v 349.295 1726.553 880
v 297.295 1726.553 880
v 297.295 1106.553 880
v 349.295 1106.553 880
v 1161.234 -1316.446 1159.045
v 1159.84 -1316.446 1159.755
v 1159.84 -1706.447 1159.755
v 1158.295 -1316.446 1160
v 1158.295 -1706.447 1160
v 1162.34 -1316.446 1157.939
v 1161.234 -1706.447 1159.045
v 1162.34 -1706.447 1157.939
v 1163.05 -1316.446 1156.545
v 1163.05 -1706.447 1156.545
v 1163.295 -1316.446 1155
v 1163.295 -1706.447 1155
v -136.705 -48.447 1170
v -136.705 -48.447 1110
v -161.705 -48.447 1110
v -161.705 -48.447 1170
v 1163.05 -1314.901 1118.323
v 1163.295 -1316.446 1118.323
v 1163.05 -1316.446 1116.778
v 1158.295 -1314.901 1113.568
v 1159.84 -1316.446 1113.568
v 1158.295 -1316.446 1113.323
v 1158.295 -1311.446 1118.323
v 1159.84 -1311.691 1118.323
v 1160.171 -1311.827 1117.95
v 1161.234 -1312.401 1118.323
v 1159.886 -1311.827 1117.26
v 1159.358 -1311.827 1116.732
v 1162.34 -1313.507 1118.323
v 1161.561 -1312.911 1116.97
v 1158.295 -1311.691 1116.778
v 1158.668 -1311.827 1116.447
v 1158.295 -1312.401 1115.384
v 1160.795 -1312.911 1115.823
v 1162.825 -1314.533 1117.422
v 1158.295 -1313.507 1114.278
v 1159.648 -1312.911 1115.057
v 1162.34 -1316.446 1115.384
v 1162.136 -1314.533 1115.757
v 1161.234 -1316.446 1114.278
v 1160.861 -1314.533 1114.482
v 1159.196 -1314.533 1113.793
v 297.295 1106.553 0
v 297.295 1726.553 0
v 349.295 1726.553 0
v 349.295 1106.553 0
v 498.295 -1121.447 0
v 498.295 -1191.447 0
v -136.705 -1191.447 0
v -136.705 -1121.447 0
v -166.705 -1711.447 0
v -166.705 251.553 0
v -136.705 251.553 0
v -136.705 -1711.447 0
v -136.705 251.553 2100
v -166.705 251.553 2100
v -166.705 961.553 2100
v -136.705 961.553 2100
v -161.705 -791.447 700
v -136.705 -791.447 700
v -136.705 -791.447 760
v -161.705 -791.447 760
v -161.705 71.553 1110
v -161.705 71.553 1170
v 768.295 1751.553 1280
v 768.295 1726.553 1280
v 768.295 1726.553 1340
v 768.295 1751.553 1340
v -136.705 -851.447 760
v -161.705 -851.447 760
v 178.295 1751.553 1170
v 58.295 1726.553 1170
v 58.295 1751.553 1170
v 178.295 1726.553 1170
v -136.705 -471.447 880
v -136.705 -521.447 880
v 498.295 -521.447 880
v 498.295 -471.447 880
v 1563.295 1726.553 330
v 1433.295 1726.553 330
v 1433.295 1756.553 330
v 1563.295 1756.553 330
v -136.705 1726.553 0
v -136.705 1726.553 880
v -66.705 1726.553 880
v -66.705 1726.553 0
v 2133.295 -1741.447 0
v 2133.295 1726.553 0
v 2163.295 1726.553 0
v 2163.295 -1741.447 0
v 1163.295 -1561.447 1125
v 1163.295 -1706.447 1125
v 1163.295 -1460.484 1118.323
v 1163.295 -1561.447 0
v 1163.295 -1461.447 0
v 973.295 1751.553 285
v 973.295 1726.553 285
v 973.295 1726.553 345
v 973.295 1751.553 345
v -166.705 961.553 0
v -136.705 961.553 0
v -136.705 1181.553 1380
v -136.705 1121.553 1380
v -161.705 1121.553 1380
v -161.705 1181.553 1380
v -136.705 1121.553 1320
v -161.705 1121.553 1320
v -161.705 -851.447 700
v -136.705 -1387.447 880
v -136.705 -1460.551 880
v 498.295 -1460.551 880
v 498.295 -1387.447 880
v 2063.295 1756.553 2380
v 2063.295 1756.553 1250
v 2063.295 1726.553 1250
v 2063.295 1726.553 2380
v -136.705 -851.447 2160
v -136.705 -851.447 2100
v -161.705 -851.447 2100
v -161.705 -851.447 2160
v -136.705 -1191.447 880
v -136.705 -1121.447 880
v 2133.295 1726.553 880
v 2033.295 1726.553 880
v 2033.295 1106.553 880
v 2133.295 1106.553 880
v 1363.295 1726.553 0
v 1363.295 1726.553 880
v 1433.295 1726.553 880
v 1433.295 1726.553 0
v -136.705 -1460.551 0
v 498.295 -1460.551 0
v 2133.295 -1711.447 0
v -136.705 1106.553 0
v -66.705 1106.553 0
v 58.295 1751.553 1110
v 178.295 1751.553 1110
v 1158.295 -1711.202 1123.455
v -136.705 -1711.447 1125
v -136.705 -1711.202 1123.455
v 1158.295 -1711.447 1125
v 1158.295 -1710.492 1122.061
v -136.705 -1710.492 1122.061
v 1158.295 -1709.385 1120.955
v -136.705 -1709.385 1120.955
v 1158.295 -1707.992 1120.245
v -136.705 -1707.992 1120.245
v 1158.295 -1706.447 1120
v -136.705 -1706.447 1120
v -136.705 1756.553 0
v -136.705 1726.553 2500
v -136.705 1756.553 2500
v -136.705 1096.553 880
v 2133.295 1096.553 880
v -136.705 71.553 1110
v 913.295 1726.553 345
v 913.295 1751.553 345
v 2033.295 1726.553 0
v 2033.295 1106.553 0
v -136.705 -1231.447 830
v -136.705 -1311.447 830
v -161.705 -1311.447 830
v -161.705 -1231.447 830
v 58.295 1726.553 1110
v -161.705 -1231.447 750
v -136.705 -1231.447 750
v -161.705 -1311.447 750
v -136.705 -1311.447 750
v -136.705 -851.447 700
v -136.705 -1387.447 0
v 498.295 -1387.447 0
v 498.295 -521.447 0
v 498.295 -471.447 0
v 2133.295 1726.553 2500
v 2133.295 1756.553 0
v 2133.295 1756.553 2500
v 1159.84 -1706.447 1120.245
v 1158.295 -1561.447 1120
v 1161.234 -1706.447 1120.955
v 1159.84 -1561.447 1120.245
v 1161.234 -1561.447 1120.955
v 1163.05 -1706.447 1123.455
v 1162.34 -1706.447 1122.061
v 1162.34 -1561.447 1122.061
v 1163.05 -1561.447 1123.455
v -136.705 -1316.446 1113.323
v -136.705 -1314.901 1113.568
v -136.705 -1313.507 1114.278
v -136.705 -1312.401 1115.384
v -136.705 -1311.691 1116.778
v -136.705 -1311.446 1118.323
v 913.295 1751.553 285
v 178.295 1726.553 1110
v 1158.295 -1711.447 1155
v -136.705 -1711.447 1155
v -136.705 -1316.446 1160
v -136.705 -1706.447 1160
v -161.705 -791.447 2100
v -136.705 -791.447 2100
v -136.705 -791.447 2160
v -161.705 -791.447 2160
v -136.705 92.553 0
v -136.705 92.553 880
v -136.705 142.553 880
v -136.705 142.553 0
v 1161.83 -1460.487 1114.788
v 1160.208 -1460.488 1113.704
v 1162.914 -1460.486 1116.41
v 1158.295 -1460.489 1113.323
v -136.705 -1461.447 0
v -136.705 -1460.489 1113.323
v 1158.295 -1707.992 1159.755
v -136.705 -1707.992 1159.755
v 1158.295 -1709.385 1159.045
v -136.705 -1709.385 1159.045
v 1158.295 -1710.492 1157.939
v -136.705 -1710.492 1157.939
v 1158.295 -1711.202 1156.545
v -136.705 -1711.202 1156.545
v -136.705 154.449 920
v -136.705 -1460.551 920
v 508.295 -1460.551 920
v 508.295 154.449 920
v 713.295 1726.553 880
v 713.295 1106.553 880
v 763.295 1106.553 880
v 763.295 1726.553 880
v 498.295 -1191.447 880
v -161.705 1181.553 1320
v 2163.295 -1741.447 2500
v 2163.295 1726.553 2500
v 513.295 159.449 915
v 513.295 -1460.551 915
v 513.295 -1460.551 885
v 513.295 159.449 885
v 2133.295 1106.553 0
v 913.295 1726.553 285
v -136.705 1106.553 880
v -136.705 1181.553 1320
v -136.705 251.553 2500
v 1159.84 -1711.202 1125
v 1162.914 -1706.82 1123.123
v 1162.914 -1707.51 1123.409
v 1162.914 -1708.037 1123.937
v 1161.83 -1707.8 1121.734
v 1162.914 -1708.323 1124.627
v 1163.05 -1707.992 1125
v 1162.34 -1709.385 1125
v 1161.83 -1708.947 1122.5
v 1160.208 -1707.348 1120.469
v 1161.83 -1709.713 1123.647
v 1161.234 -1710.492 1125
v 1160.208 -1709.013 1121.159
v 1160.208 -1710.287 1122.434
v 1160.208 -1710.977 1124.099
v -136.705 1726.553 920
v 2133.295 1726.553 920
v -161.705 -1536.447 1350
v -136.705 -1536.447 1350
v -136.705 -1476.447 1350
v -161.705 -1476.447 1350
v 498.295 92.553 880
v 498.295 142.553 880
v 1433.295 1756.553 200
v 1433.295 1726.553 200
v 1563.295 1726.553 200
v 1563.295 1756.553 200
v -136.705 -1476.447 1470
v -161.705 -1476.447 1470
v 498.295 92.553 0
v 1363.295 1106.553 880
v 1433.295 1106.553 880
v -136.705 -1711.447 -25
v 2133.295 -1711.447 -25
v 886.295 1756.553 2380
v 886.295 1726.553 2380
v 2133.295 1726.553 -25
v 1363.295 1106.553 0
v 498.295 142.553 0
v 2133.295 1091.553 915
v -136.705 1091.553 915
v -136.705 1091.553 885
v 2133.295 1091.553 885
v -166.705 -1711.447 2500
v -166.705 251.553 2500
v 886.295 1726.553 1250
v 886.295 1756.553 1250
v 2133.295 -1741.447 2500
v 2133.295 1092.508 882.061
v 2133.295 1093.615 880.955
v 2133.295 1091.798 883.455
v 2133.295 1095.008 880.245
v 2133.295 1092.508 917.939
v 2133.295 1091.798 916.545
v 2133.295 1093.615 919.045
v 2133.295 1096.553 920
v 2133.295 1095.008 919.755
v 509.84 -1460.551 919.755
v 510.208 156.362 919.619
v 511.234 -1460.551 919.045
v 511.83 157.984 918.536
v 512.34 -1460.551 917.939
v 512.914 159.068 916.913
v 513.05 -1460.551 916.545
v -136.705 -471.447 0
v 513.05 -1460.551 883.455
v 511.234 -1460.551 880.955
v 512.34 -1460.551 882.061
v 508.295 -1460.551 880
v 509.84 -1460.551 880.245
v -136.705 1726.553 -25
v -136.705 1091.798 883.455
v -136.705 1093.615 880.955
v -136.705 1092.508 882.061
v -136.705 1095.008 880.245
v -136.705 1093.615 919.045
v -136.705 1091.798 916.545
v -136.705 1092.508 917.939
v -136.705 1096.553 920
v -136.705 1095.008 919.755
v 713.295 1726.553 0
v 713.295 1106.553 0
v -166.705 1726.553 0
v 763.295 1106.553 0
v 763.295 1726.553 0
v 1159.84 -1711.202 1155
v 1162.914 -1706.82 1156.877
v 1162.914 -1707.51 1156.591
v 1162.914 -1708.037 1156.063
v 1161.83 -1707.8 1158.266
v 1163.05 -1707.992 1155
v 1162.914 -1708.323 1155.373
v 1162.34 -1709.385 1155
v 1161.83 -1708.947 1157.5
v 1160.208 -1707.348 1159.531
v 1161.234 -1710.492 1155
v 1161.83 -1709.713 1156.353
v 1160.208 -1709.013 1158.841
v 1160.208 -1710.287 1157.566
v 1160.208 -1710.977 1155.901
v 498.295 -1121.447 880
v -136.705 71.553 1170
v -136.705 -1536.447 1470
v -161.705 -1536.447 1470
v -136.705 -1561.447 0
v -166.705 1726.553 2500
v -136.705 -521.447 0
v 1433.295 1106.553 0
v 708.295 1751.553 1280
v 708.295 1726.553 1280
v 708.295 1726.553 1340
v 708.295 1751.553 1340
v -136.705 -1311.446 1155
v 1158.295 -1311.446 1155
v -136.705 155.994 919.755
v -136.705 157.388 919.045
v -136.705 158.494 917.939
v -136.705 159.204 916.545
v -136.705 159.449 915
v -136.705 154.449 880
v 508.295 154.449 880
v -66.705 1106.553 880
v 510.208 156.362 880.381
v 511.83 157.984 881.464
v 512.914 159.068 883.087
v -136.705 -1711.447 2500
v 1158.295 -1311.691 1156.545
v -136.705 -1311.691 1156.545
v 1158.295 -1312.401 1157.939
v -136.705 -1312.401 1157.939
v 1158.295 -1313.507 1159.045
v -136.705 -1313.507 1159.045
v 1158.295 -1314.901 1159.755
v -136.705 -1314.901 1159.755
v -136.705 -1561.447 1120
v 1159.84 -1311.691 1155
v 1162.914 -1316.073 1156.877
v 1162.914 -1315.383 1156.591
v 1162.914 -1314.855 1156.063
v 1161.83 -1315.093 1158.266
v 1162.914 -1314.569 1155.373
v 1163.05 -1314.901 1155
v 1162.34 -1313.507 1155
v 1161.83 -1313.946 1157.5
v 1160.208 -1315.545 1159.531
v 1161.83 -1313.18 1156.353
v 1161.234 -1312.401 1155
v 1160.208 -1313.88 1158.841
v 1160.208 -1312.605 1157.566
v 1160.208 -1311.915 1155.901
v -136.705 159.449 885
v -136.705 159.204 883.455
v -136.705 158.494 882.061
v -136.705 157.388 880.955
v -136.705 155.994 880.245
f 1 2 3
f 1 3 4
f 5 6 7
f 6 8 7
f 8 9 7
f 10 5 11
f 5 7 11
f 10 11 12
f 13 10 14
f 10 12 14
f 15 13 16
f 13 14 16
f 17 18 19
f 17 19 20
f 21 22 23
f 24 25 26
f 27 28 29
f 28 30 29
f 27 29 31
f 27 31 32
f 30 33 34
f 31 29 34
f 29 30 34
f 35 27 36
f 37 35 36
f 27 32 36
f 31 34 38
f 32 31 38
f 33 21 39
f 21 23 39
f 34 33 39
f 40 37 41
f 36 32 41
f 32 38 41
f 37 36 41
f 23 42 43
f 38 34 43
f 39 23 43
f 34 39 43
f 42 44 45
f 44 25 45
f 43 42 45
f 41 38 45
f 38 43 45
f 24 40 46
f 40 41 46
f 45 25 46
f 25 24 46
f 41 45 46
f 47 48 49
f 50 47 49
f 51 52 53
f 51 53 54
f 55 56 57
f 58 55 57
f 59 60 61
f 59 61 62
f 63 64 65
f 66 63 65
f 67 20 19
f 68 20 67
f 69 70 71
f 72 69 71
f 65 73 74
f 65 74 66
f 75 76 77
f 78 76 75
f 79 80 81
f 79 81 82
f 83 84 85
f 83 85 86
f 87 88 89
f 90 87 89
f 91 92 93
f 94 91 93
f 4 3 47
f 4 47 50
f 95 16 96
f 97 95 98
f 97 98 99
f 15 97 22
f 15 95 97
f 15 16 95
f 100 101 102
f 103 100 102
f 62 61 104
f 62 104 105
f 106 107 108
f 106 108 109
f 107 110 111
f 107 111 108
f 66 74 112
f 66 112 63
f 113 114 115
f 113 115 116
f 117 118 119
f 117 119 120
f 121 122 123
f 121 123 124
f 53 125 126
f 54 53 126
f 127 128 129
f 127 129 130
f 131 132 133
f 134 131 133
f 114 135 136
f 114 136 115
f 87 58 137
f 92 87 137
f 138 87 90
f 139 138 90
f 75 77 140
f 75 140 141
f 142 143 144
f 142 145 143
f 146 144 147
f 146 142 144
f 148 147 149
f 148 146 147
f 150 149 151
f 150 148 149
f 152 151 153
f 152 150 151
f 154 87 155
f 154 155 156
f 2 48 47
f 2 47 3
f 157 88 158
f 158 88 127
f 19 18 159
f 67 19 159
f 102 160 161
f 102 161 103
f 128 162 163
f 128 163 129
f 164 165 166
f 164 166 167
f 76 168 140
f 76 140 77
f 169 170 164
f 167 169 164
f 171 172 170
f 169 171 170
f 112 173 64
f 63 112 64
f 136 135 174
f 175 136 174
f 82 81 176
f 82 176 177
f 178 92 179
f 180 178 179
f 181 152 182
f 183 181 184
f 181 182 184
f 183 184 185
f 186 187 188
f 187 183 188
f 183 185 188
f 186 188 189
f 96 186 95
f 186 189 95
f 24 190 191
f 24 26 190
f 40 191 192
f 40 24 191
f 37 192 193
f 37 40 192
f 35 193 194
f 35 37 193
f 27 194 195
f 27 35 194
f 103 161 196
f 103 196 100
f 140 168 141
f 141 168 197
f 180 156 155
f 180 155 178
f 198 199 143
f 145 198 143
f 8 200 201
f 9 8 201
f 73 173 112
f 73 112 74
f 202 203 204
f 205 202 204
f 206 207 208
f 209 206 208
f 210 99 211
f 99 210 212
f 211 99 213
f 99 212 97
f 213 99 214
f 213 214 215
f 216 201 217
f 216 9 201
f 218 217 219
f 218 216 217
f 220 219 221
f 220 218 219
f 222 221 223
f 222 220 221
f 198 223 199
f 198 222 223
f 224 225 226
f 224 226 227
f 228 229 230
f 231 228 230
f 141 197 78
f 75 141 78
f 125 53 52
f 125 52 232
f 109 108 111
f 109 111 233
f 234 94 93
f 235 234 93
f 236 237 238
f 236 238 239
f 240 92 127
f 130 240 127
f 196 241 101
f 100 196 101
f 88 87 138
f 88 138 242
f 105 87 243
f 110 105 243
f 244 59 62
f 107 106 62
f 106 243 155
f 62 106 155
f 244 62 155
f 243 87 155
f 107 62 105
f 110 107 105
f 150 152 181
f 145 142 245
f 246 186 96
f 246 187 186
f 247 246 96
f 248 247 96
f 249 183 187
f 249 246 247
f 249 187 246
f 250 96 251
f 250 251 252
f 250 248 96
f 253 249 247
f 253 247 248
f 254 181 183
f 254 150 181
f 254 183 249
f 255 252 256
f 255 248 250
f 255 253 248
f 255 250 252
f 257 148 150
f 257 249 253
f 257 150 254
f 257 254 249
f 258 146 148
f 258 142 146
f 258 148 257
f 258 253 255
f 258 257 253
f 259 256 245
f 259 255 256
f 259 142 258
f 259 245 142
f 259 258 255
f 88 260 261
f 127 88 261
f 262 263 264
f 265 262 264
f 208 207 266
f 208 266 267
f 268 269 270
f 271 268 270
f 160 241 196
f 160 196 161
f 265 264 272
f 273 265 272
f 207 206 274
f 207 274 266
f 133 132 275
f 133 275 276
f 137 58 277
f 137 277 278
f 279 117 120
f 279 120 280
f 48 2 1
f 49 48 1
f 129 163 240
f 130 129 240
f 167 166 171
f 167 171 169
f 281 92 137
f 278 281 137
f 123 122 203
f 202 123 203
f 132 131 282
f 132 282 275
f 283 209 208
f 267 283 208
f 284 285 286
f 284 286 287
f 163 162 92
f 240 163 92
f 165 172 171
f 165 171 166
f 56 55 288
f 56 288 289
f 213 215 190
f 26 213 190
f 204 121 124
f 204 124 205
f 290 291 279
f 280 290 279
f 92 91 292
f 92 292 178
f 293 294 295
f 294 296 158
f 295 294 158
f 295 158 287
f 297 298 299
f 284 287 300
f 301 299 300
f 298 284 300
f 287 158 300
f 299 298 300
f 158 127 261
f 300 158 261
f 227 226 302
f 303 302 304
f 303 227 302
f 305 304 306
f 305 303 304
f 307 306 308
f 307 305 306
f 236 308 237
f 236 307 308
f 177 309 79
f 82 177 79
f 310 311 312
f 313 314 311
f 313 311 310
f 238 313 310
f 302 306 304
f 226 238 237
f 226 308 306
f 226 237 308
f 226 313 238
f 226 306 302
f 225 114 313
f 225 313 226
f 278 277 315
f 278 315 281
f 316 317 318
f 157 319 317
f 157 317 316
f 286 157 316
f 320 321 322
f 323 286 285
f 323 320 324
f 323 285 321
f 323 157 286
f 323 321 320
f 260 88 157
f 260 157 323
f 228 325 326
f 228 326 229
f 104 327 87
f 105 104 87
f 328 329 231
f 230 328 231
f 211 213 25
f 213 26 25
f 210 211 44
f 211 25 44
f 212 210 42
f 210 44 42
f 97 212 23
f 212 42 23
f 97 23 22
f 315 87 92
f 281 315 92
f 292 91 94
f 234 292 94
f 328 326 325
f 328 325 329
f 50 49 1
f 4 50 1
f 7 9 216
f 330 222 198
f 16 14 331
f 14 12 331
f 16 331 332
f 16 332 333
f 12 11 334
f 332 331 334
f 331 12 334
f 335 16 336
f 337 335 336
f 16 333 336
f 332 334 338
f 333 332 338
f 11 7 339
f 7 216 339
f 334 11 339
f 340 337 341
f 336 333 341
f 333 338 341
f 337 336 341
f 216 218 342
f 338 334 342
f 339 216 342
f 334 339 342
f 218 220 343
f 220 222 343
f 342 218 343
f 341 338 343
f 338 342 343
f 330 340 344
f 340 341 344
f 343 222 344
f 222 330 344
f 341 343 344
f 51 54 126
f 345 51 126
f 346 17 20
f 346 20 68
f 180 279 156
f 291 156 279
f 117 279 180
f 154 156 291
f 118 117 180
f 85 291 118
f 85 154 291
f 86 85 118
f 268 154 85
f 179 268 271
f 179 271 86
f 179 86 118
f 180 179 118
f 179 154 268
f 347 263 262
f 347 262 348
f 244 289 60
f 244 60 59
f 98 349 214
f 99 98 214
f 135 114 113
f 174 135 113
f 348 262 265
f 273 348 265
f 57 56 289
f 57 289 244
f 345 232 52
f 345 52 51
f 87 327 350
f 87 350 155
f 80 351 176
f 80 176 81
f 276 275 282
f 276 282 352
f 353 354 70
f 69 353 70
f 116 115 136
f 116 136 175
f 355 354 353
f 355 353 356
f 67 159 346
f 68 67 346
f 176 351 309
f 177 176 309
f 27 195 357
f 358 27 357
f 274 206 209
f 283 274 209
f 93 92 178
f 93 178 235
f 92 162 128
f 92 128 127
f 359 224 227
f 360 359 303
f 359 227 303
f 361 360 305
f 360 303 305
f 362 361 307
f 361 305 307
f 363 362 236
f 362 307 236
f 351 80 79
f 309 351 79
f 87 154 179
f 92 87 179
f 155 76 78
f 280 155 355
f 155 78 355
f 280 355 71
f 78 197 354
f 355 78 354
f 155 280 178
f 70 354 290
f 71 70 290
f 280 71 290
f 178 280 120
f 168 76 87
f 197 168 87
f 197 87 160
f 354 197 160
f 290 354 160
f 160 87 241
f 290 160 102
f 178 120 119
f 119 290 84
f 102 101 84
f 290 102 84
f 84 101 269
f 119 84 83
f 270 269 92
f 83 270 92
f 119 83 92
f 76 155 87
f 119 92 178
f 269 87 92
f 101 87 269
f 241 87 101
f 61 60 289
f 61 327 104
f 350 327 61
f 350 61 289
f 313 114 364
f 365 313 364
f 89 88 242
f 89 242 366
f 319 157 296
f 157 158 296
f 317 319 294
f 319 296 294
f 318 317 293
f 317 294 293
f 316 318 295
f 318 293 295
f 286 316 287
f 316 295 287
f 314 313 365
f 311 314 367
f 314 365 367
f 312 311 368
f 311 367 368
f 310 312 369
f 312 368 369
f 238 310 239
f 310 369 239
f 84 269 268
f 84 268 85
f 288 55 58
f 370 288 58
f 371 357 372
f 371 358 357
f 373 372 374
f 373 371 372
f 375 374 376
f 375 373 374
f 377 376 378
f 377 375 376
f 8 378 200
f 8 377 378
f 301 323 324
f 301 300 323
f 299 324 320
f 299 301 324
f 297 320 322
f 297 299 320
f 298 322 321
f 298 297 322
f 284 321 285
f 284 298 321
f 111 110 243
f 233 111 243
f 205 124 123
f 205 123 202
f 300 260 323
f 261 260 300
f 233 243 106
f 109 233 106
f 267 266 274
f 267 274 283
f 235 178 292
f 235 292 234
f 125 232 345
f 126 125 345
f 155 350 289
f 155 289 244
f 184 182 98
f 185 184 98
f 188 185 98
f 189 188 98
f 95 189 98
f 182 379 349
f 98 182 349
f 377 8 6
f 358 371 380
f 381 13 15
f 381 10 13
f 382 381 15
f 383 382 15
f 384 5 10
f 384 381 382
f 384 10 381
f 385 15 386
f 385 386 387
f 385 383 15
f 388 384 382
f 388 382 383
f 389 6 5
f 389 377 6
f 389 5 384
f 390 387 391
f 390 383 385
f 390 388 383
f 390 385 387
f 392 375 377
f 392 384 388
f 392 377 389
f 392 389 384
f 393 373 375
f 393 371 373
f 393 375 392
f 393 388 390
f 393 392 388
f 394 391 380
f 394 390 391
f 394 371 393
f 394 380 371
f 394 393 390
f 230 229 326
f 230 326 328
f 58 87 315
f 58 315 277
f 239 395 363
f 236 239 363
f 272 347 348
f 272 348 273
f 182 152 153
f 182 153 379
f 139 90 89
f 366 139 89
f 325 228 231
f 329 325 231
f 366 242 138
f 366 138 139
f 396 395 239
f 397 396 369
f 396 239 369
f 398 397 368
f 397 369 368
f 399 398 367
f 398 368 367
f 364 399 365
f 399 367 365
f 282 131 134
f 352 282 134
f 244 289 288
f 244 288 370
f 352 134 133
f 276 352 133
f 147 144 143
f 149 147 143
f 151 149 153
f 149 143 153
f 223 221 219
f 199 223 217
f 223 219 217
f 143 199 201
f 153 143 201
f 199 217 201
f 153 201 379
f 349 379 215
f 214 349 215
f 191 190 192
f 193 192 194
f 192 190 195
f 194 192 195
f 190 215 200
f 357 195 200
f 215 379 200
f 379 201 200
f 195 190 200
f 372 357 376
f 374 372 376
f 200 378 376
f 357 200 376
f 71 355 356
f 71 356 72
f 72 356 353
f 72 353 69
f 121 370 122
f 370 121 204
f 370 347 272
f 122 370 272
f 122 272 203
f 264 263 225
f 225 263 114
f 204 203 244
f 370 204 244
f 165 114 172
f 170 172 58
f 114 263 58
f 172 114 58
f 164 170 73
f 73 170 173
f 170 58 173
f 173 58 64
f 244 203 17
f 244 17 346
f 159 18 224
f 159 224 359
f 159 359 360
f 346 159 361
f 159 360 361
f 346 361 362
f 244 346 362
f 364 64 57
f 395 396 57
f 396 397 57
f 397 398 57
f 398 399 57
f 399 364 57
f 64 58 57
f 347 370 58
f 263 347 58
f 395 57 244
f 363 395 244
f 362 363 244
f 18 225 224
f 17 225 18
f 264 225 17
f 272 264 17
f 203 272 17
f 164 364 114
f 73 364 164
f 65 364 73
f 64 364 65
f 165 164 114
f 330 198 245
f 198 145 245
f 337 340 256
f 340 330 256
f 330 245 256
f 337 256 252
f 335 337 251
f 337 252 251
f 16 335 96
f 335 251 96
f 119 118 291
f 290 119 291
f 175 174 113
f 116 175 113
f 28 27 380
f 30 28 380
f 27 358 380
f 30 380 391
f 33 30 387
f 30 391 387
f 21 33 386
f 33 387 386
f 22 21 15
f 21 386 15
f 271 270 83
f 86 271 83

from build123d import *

# Parameters (mm, degrees)
F0_W      = 2270
F0_H      = 30
F1_DEPTH  = 2500
F0_W_2    = 30
F0_H_2    = 3468
F0_H_3    = 765
F0_H_4    = 1963
F2_W      = 2270
F2_H      = 3438
F3_DEPTH  = 25
F4_W      = 2270
F4_H      = 40
F5_DEPTH  = 635
F7_DEPTH  = 1300
F6_W      = 1620
F6_H      = 40
F8_DEPTH  = 650
F9_W      = 1177
F9_H      = 1130
F10_DEPTH = 3498.001
F11_W     = 30
F11_H     = 400
F12_DEPTH = 710
F13_W     = 70
F13_H     = 880
F14_DEPTH = 635
F13_W_2   = 73.1048560888
F13_W_3   = 50
F15_R     = 5
F16_R     = 5
F17_R     = 5
F18_W     = 100
F18_H     = 880
F19_DEPTH = 620
F18_W_2   = 70
F18_W_3   = 50
F18_W_4   = 52
F20_W     = 60
F20_H     = 120
F20_H_2   = 60
F20_W_2   = 80
F20_H_3   = 80
F20_W_3   = 120
F21_DEPTH = 25
F22_W     = 60
F22_H     = 60
F22_W_2   = 120
F22_W_3   = 130
F22_H_2   = 130
F23_DEPTH = 25
F24_DEPTH = 100


with BuildPart() as f1:
    # F0 (on Top) → F1 (new body)
    with BuildSketch(Plane.XY):
        with Locations((998.2948233199, 1741.5534749776)):
            Rectangle(F0_W, F0_H)
    extrude(amount=F1_DEPTH)

    # F9 (on face) → F10 (cut, through all)
    with BuildSketch(Plane(origin=(0, 1756.5534749776, 0), x_dir=(-1, 0, 0), z_dir=(0, 1, 0))):
        with Locations((-1474.7948233199, 1815)):
            Rectangle(F9_W, F9_H)
    extrude(amount=-F10_DEPTH, mode=Mode.SUBTRACT)

    # F22 (on face) → F23 (cut)
    with BuildSketch(Plane.XZ.offset(-1726.5534749776)):
        with Locations((738.2948233199, 1310)):
            Rectangle(F22_W, F22_H)
        with Locations((118.2948233199, 1140)):
            Rectangle(F22_W_2, F22_H)
        with Locations((943.2948233199, 315)):
            Rectangle(F22_W, F22_H)
        with Locations((1498.2948233199, 265)):
            Rectangle(F22_W_3, F22_H_2)
    extrude(amount=-F23_DEPTH, mode=Mode.SUBTRACT)

    # F22 (on face) → F24 (cut)
    with BuildSketch(Plane.XZ.offset(-1726.5534749776)):
        with Locations((1498.2948233199, 265)):
            Rectangle(F22_W_3, F22_H_2)
    extrude(amount=-F24_DEPTH, mode=Mode.SUBTRACT)


with BuildPart() as f1b:
    # F0 (on Top) → F1, piece 2 (new body)
    with BuildSketch(Plane.XY):
        with Locations((2148.2948233199, -7.4465250224)):
            Rectangle(F0_W_2, F0_H_2)
    extrude(amount=F1_DEPTH)


with BuildPart() as f1c:
    # F0 (on Top) → F1, piece 3 (new body)
    with BuildSketch(Plane.XY):
        with Locations((-151.7051766801, 1344.0534749776)):
            Rectangle(F0_W_2, F0_H_3)
    extrude(amount=F1_DEPTH)

    # F11 (on face) → F12 (join)
    with BuildSketch(Plane.XZ.offset(-961.5534749776)):
        with Locations((-151.7051766801, 2300)):
            Rectangle(F11_W, F11_H)
    extrude(amount=F12_DEPTH)


with BuildPart() as f1d:
    # F0 (on Top) → F1, piece 4 (new body)
    with BuildSketch(Plane.XY):
        with Locations((-151.7051766801, -729.9465250224)):
            Rectangle(F0_W_2, F0_H_4)
    extrude(amount=F1_DEPTH)

    # F6 (on face) → F8 (join)
    with BuildSketch(Plane.YZ.offset(-136.7051766801)):
        with Locations((-650.5513811111, 900)):
            Rectangle(F6_W, F6_H)
    extrude(amount=F8_DEPTH)

    # F15
    f15_edges = [f1d.edges().sort_by_distance(p)[0] for p in [
        (188.294823, 159.448619, 920),
        (513.294823, -650.551381, 920),
        (188.294823, 159.448619, 880),
        (513.294823, -650.551381, 880),
    ]]
    fillet(f15_edges, radius=F15_R)


with BuildPart() as f3:
    # F2 (on face) → F3 (new body)
    with BuildSketch(Plane(origin=(0, 0, 0), x_dir=(1, 0, 0), z_dir=(0, 0, -1))):
        with Locations((998.2948233199, -7.5534749776)):
            Rectangle(F2_W, F2_H)
    extrude(amount=F3_DEPTH)


with BuildPart() as f5:
    # F4 (on face) → F5 (new body)
    with BuildSketch(Plane.XZ.offset(-1726.5534749776)):
        with Locations((998.2948233199, 900)):
            Rectangle(F4_W, F4_H)
    extrude(amount=F5_DEPTH)

    # F17
    f17_edges = [f5.edges().sort_by_distance(p)[0] for p in [
        (998.294823, 1091.553475, 920),
        (998.294823, 1091.553475, 880),
    ]]
    fillet(f17_edges, radius=F17_R)


with BuildPart() as f7:
    # F6 (on face) → F7 (new body)
    with BuildSketch(Plane.YZ.offset(-136.7051766801)):
        Polygon((-1461.4465250224, 0), (-1460.689416728, 880), (-1460.4886770248, 1113.3232116699), (-1311.446047813, 1113.3232116699), (-1311.446047813, 1160), (-1511.4465250224, 1160), (-1711.4465250224, 1160), (-1711.4465250224, 1120), (-1561.4465250224, 1120), (-1561.4465250224, 0), align=None)
    extrude(amount=F7_DEPTH)

    # F16
    f16_edges = [f7.edges().sort_by_distance(p)[0] for p in [
        (513.294823, -1711.446525, 1160),
        (513.294823, -1311.446048, 1160),
        (1163.294823, -1511.446286, 1160),
        (513.294823, -1711.446525, 1120),
        (1163.294823, -1636.446525, 1120),
        (1163.294823, -1385.967362, 1113.323212),
        (1163.294823, -1711.446525, 1140),
        (1163.294823, -1311.446048, 1136.661606),
        (513.294823, -1311.446048, 1113.323212),
    ]]
    fillet(f16_edges, radius=F16_R)


with BuildPart() as f14:
    # F13 (on face) → F14 (new body)
    with BuildSketch(Plane.YZ.offset(-136.7051766801)):
        with Locations((-1156.4465250224, 440)):
            Rectangle(F13_W, F13_H)
    extrude(amount=F14_DEPTH)


with BuildPart() as f14b:
    # F13 (on face) → F14, piece 2 (new body)
    with BuildSketch(Plane.YZ.offset(-136.7051766801)):
        with Locations((-1423.9989530668, 440)):
            Rectangle(F13_W_2, F13_H)
    extrude(amount=F14_DEPTH)


with BuildPart() as f14c:
    # F13 (on face) → F14, piece 3 (new body)
    with BuildSketch(Plane.YZ.offset(-136.7051766801)):
        with Locations((-496.4465250224, 440)):
            Rectangle(F13_W_3, F13_H)
    extrude(amount=F14_DEPTH)


with BuildPart() as f14d:
    # F13 (on face) → F14, piece 4 (new body)
    with BuildSketch(Plane.YZ.offset(-136.7051766801)):
        with Locations((117.5534749776, 440)):
            Rectangle(F13_W_3, F13_H)
    extrude(amount=F14_DEPTH)


with BuildPart() as f19:
    # F18 (on face) → F19 (new body)
    with BuildSketch(Plane.XZ.offset(-1726.5534749776)):
        with Locations((2083.2948233199, 440)):
            Rectangle(F18_W, F18_H)
    extrude(amount=F19_DEPTH)


with BuildPart() as f19b:
    # F18 (on face) → F19, piece 2 (new body)
    with BuildSketch(Plane.XZ.offset(-1726.5534749776)):
        with Locations((1398.2948233199, 440)):
            Rectangle(F18_W_2, F18_H)
    extrude(amount=F19_DEPTH)


with BuildPart() as f19c:
    # F18 (on face) → F19, piece 3 (new body)
    with BuildSketch(Plane.XZ.offset(-1726.5534749776)):
        with Locations((738.2948233199, 440)):
            Rectangle(F18_W_3, F18_H)
    extrude(amount=F19_DEPTH)


with BuildPart() as f19d:
    # F18 (on face) → F19, piece 4 (new body)
    with BuildSketch(Plane.XZ.offset(-1726.5534749776)):
        with Locations((-101.7051766801, 440)):
            Rectangle(F18_W_2, F18_H)
    extrude(amount=F19_DEPTH)


with BuildPart() as f19e:
    # F18 (on face) → F19, piece 5 (new body)
    with BuildSketch(Plane.XZ.offset(-1726.5534749776)):
        with Locations((323.2948233199, 440)):
            Rectangle(F18_W_4, F18_H)
    extrude(amount=F19_DEPTH)


with BuildPart() as f21_tool:
    # F20 (on face) → F21 (new body)
    with BuildSketch(Plane.YZ.offset(-136.7051766801)):
        with Locations((-1506.4465250224, 1410)):
            Rectangle(F20_W, F20_H)
        with Locations((-821.4465250224, 2130)):
            Rectangle(F20_W, F20_H_2)
        with Locations((-1271.4465250224, 790)):
            Rectangle(F20_W_2, F20_H_3)
        with Locations((-821.4465250224, 730)):
            Rectangle(F20_W, F20_H_2)
        with Locations((1151.5534749776, 1350)):
            Rectangle(F20_W, F20_H_2)
        with Locations((11.5534749776, 1140)):
            Rectangle(F20_W_3, F20_H_2)
    extrude(amount=-F21_DEPTH)


with BuildPart() as f1c_1:
    add(f1c.part)

    # F21: cut by f21_tool
    add(f21_tool.part, mode=Mode.SUBTRACT)


with BuildPart() as f1d_1:
    add(f1d.part)

    # F21: cut by f21_tool
    add(f21_tool.part, mode=Mode.SUBTRACT)


solid = Compound([f1.part, f1b.part, f3.part, f5.part, f7.part, f14.part, f14b.part, f14c.part, f14d.part, f19.part, f19b.part, f19c.part, f19d.part, f19e.part, f1c_1.part, f1d_1.part])
